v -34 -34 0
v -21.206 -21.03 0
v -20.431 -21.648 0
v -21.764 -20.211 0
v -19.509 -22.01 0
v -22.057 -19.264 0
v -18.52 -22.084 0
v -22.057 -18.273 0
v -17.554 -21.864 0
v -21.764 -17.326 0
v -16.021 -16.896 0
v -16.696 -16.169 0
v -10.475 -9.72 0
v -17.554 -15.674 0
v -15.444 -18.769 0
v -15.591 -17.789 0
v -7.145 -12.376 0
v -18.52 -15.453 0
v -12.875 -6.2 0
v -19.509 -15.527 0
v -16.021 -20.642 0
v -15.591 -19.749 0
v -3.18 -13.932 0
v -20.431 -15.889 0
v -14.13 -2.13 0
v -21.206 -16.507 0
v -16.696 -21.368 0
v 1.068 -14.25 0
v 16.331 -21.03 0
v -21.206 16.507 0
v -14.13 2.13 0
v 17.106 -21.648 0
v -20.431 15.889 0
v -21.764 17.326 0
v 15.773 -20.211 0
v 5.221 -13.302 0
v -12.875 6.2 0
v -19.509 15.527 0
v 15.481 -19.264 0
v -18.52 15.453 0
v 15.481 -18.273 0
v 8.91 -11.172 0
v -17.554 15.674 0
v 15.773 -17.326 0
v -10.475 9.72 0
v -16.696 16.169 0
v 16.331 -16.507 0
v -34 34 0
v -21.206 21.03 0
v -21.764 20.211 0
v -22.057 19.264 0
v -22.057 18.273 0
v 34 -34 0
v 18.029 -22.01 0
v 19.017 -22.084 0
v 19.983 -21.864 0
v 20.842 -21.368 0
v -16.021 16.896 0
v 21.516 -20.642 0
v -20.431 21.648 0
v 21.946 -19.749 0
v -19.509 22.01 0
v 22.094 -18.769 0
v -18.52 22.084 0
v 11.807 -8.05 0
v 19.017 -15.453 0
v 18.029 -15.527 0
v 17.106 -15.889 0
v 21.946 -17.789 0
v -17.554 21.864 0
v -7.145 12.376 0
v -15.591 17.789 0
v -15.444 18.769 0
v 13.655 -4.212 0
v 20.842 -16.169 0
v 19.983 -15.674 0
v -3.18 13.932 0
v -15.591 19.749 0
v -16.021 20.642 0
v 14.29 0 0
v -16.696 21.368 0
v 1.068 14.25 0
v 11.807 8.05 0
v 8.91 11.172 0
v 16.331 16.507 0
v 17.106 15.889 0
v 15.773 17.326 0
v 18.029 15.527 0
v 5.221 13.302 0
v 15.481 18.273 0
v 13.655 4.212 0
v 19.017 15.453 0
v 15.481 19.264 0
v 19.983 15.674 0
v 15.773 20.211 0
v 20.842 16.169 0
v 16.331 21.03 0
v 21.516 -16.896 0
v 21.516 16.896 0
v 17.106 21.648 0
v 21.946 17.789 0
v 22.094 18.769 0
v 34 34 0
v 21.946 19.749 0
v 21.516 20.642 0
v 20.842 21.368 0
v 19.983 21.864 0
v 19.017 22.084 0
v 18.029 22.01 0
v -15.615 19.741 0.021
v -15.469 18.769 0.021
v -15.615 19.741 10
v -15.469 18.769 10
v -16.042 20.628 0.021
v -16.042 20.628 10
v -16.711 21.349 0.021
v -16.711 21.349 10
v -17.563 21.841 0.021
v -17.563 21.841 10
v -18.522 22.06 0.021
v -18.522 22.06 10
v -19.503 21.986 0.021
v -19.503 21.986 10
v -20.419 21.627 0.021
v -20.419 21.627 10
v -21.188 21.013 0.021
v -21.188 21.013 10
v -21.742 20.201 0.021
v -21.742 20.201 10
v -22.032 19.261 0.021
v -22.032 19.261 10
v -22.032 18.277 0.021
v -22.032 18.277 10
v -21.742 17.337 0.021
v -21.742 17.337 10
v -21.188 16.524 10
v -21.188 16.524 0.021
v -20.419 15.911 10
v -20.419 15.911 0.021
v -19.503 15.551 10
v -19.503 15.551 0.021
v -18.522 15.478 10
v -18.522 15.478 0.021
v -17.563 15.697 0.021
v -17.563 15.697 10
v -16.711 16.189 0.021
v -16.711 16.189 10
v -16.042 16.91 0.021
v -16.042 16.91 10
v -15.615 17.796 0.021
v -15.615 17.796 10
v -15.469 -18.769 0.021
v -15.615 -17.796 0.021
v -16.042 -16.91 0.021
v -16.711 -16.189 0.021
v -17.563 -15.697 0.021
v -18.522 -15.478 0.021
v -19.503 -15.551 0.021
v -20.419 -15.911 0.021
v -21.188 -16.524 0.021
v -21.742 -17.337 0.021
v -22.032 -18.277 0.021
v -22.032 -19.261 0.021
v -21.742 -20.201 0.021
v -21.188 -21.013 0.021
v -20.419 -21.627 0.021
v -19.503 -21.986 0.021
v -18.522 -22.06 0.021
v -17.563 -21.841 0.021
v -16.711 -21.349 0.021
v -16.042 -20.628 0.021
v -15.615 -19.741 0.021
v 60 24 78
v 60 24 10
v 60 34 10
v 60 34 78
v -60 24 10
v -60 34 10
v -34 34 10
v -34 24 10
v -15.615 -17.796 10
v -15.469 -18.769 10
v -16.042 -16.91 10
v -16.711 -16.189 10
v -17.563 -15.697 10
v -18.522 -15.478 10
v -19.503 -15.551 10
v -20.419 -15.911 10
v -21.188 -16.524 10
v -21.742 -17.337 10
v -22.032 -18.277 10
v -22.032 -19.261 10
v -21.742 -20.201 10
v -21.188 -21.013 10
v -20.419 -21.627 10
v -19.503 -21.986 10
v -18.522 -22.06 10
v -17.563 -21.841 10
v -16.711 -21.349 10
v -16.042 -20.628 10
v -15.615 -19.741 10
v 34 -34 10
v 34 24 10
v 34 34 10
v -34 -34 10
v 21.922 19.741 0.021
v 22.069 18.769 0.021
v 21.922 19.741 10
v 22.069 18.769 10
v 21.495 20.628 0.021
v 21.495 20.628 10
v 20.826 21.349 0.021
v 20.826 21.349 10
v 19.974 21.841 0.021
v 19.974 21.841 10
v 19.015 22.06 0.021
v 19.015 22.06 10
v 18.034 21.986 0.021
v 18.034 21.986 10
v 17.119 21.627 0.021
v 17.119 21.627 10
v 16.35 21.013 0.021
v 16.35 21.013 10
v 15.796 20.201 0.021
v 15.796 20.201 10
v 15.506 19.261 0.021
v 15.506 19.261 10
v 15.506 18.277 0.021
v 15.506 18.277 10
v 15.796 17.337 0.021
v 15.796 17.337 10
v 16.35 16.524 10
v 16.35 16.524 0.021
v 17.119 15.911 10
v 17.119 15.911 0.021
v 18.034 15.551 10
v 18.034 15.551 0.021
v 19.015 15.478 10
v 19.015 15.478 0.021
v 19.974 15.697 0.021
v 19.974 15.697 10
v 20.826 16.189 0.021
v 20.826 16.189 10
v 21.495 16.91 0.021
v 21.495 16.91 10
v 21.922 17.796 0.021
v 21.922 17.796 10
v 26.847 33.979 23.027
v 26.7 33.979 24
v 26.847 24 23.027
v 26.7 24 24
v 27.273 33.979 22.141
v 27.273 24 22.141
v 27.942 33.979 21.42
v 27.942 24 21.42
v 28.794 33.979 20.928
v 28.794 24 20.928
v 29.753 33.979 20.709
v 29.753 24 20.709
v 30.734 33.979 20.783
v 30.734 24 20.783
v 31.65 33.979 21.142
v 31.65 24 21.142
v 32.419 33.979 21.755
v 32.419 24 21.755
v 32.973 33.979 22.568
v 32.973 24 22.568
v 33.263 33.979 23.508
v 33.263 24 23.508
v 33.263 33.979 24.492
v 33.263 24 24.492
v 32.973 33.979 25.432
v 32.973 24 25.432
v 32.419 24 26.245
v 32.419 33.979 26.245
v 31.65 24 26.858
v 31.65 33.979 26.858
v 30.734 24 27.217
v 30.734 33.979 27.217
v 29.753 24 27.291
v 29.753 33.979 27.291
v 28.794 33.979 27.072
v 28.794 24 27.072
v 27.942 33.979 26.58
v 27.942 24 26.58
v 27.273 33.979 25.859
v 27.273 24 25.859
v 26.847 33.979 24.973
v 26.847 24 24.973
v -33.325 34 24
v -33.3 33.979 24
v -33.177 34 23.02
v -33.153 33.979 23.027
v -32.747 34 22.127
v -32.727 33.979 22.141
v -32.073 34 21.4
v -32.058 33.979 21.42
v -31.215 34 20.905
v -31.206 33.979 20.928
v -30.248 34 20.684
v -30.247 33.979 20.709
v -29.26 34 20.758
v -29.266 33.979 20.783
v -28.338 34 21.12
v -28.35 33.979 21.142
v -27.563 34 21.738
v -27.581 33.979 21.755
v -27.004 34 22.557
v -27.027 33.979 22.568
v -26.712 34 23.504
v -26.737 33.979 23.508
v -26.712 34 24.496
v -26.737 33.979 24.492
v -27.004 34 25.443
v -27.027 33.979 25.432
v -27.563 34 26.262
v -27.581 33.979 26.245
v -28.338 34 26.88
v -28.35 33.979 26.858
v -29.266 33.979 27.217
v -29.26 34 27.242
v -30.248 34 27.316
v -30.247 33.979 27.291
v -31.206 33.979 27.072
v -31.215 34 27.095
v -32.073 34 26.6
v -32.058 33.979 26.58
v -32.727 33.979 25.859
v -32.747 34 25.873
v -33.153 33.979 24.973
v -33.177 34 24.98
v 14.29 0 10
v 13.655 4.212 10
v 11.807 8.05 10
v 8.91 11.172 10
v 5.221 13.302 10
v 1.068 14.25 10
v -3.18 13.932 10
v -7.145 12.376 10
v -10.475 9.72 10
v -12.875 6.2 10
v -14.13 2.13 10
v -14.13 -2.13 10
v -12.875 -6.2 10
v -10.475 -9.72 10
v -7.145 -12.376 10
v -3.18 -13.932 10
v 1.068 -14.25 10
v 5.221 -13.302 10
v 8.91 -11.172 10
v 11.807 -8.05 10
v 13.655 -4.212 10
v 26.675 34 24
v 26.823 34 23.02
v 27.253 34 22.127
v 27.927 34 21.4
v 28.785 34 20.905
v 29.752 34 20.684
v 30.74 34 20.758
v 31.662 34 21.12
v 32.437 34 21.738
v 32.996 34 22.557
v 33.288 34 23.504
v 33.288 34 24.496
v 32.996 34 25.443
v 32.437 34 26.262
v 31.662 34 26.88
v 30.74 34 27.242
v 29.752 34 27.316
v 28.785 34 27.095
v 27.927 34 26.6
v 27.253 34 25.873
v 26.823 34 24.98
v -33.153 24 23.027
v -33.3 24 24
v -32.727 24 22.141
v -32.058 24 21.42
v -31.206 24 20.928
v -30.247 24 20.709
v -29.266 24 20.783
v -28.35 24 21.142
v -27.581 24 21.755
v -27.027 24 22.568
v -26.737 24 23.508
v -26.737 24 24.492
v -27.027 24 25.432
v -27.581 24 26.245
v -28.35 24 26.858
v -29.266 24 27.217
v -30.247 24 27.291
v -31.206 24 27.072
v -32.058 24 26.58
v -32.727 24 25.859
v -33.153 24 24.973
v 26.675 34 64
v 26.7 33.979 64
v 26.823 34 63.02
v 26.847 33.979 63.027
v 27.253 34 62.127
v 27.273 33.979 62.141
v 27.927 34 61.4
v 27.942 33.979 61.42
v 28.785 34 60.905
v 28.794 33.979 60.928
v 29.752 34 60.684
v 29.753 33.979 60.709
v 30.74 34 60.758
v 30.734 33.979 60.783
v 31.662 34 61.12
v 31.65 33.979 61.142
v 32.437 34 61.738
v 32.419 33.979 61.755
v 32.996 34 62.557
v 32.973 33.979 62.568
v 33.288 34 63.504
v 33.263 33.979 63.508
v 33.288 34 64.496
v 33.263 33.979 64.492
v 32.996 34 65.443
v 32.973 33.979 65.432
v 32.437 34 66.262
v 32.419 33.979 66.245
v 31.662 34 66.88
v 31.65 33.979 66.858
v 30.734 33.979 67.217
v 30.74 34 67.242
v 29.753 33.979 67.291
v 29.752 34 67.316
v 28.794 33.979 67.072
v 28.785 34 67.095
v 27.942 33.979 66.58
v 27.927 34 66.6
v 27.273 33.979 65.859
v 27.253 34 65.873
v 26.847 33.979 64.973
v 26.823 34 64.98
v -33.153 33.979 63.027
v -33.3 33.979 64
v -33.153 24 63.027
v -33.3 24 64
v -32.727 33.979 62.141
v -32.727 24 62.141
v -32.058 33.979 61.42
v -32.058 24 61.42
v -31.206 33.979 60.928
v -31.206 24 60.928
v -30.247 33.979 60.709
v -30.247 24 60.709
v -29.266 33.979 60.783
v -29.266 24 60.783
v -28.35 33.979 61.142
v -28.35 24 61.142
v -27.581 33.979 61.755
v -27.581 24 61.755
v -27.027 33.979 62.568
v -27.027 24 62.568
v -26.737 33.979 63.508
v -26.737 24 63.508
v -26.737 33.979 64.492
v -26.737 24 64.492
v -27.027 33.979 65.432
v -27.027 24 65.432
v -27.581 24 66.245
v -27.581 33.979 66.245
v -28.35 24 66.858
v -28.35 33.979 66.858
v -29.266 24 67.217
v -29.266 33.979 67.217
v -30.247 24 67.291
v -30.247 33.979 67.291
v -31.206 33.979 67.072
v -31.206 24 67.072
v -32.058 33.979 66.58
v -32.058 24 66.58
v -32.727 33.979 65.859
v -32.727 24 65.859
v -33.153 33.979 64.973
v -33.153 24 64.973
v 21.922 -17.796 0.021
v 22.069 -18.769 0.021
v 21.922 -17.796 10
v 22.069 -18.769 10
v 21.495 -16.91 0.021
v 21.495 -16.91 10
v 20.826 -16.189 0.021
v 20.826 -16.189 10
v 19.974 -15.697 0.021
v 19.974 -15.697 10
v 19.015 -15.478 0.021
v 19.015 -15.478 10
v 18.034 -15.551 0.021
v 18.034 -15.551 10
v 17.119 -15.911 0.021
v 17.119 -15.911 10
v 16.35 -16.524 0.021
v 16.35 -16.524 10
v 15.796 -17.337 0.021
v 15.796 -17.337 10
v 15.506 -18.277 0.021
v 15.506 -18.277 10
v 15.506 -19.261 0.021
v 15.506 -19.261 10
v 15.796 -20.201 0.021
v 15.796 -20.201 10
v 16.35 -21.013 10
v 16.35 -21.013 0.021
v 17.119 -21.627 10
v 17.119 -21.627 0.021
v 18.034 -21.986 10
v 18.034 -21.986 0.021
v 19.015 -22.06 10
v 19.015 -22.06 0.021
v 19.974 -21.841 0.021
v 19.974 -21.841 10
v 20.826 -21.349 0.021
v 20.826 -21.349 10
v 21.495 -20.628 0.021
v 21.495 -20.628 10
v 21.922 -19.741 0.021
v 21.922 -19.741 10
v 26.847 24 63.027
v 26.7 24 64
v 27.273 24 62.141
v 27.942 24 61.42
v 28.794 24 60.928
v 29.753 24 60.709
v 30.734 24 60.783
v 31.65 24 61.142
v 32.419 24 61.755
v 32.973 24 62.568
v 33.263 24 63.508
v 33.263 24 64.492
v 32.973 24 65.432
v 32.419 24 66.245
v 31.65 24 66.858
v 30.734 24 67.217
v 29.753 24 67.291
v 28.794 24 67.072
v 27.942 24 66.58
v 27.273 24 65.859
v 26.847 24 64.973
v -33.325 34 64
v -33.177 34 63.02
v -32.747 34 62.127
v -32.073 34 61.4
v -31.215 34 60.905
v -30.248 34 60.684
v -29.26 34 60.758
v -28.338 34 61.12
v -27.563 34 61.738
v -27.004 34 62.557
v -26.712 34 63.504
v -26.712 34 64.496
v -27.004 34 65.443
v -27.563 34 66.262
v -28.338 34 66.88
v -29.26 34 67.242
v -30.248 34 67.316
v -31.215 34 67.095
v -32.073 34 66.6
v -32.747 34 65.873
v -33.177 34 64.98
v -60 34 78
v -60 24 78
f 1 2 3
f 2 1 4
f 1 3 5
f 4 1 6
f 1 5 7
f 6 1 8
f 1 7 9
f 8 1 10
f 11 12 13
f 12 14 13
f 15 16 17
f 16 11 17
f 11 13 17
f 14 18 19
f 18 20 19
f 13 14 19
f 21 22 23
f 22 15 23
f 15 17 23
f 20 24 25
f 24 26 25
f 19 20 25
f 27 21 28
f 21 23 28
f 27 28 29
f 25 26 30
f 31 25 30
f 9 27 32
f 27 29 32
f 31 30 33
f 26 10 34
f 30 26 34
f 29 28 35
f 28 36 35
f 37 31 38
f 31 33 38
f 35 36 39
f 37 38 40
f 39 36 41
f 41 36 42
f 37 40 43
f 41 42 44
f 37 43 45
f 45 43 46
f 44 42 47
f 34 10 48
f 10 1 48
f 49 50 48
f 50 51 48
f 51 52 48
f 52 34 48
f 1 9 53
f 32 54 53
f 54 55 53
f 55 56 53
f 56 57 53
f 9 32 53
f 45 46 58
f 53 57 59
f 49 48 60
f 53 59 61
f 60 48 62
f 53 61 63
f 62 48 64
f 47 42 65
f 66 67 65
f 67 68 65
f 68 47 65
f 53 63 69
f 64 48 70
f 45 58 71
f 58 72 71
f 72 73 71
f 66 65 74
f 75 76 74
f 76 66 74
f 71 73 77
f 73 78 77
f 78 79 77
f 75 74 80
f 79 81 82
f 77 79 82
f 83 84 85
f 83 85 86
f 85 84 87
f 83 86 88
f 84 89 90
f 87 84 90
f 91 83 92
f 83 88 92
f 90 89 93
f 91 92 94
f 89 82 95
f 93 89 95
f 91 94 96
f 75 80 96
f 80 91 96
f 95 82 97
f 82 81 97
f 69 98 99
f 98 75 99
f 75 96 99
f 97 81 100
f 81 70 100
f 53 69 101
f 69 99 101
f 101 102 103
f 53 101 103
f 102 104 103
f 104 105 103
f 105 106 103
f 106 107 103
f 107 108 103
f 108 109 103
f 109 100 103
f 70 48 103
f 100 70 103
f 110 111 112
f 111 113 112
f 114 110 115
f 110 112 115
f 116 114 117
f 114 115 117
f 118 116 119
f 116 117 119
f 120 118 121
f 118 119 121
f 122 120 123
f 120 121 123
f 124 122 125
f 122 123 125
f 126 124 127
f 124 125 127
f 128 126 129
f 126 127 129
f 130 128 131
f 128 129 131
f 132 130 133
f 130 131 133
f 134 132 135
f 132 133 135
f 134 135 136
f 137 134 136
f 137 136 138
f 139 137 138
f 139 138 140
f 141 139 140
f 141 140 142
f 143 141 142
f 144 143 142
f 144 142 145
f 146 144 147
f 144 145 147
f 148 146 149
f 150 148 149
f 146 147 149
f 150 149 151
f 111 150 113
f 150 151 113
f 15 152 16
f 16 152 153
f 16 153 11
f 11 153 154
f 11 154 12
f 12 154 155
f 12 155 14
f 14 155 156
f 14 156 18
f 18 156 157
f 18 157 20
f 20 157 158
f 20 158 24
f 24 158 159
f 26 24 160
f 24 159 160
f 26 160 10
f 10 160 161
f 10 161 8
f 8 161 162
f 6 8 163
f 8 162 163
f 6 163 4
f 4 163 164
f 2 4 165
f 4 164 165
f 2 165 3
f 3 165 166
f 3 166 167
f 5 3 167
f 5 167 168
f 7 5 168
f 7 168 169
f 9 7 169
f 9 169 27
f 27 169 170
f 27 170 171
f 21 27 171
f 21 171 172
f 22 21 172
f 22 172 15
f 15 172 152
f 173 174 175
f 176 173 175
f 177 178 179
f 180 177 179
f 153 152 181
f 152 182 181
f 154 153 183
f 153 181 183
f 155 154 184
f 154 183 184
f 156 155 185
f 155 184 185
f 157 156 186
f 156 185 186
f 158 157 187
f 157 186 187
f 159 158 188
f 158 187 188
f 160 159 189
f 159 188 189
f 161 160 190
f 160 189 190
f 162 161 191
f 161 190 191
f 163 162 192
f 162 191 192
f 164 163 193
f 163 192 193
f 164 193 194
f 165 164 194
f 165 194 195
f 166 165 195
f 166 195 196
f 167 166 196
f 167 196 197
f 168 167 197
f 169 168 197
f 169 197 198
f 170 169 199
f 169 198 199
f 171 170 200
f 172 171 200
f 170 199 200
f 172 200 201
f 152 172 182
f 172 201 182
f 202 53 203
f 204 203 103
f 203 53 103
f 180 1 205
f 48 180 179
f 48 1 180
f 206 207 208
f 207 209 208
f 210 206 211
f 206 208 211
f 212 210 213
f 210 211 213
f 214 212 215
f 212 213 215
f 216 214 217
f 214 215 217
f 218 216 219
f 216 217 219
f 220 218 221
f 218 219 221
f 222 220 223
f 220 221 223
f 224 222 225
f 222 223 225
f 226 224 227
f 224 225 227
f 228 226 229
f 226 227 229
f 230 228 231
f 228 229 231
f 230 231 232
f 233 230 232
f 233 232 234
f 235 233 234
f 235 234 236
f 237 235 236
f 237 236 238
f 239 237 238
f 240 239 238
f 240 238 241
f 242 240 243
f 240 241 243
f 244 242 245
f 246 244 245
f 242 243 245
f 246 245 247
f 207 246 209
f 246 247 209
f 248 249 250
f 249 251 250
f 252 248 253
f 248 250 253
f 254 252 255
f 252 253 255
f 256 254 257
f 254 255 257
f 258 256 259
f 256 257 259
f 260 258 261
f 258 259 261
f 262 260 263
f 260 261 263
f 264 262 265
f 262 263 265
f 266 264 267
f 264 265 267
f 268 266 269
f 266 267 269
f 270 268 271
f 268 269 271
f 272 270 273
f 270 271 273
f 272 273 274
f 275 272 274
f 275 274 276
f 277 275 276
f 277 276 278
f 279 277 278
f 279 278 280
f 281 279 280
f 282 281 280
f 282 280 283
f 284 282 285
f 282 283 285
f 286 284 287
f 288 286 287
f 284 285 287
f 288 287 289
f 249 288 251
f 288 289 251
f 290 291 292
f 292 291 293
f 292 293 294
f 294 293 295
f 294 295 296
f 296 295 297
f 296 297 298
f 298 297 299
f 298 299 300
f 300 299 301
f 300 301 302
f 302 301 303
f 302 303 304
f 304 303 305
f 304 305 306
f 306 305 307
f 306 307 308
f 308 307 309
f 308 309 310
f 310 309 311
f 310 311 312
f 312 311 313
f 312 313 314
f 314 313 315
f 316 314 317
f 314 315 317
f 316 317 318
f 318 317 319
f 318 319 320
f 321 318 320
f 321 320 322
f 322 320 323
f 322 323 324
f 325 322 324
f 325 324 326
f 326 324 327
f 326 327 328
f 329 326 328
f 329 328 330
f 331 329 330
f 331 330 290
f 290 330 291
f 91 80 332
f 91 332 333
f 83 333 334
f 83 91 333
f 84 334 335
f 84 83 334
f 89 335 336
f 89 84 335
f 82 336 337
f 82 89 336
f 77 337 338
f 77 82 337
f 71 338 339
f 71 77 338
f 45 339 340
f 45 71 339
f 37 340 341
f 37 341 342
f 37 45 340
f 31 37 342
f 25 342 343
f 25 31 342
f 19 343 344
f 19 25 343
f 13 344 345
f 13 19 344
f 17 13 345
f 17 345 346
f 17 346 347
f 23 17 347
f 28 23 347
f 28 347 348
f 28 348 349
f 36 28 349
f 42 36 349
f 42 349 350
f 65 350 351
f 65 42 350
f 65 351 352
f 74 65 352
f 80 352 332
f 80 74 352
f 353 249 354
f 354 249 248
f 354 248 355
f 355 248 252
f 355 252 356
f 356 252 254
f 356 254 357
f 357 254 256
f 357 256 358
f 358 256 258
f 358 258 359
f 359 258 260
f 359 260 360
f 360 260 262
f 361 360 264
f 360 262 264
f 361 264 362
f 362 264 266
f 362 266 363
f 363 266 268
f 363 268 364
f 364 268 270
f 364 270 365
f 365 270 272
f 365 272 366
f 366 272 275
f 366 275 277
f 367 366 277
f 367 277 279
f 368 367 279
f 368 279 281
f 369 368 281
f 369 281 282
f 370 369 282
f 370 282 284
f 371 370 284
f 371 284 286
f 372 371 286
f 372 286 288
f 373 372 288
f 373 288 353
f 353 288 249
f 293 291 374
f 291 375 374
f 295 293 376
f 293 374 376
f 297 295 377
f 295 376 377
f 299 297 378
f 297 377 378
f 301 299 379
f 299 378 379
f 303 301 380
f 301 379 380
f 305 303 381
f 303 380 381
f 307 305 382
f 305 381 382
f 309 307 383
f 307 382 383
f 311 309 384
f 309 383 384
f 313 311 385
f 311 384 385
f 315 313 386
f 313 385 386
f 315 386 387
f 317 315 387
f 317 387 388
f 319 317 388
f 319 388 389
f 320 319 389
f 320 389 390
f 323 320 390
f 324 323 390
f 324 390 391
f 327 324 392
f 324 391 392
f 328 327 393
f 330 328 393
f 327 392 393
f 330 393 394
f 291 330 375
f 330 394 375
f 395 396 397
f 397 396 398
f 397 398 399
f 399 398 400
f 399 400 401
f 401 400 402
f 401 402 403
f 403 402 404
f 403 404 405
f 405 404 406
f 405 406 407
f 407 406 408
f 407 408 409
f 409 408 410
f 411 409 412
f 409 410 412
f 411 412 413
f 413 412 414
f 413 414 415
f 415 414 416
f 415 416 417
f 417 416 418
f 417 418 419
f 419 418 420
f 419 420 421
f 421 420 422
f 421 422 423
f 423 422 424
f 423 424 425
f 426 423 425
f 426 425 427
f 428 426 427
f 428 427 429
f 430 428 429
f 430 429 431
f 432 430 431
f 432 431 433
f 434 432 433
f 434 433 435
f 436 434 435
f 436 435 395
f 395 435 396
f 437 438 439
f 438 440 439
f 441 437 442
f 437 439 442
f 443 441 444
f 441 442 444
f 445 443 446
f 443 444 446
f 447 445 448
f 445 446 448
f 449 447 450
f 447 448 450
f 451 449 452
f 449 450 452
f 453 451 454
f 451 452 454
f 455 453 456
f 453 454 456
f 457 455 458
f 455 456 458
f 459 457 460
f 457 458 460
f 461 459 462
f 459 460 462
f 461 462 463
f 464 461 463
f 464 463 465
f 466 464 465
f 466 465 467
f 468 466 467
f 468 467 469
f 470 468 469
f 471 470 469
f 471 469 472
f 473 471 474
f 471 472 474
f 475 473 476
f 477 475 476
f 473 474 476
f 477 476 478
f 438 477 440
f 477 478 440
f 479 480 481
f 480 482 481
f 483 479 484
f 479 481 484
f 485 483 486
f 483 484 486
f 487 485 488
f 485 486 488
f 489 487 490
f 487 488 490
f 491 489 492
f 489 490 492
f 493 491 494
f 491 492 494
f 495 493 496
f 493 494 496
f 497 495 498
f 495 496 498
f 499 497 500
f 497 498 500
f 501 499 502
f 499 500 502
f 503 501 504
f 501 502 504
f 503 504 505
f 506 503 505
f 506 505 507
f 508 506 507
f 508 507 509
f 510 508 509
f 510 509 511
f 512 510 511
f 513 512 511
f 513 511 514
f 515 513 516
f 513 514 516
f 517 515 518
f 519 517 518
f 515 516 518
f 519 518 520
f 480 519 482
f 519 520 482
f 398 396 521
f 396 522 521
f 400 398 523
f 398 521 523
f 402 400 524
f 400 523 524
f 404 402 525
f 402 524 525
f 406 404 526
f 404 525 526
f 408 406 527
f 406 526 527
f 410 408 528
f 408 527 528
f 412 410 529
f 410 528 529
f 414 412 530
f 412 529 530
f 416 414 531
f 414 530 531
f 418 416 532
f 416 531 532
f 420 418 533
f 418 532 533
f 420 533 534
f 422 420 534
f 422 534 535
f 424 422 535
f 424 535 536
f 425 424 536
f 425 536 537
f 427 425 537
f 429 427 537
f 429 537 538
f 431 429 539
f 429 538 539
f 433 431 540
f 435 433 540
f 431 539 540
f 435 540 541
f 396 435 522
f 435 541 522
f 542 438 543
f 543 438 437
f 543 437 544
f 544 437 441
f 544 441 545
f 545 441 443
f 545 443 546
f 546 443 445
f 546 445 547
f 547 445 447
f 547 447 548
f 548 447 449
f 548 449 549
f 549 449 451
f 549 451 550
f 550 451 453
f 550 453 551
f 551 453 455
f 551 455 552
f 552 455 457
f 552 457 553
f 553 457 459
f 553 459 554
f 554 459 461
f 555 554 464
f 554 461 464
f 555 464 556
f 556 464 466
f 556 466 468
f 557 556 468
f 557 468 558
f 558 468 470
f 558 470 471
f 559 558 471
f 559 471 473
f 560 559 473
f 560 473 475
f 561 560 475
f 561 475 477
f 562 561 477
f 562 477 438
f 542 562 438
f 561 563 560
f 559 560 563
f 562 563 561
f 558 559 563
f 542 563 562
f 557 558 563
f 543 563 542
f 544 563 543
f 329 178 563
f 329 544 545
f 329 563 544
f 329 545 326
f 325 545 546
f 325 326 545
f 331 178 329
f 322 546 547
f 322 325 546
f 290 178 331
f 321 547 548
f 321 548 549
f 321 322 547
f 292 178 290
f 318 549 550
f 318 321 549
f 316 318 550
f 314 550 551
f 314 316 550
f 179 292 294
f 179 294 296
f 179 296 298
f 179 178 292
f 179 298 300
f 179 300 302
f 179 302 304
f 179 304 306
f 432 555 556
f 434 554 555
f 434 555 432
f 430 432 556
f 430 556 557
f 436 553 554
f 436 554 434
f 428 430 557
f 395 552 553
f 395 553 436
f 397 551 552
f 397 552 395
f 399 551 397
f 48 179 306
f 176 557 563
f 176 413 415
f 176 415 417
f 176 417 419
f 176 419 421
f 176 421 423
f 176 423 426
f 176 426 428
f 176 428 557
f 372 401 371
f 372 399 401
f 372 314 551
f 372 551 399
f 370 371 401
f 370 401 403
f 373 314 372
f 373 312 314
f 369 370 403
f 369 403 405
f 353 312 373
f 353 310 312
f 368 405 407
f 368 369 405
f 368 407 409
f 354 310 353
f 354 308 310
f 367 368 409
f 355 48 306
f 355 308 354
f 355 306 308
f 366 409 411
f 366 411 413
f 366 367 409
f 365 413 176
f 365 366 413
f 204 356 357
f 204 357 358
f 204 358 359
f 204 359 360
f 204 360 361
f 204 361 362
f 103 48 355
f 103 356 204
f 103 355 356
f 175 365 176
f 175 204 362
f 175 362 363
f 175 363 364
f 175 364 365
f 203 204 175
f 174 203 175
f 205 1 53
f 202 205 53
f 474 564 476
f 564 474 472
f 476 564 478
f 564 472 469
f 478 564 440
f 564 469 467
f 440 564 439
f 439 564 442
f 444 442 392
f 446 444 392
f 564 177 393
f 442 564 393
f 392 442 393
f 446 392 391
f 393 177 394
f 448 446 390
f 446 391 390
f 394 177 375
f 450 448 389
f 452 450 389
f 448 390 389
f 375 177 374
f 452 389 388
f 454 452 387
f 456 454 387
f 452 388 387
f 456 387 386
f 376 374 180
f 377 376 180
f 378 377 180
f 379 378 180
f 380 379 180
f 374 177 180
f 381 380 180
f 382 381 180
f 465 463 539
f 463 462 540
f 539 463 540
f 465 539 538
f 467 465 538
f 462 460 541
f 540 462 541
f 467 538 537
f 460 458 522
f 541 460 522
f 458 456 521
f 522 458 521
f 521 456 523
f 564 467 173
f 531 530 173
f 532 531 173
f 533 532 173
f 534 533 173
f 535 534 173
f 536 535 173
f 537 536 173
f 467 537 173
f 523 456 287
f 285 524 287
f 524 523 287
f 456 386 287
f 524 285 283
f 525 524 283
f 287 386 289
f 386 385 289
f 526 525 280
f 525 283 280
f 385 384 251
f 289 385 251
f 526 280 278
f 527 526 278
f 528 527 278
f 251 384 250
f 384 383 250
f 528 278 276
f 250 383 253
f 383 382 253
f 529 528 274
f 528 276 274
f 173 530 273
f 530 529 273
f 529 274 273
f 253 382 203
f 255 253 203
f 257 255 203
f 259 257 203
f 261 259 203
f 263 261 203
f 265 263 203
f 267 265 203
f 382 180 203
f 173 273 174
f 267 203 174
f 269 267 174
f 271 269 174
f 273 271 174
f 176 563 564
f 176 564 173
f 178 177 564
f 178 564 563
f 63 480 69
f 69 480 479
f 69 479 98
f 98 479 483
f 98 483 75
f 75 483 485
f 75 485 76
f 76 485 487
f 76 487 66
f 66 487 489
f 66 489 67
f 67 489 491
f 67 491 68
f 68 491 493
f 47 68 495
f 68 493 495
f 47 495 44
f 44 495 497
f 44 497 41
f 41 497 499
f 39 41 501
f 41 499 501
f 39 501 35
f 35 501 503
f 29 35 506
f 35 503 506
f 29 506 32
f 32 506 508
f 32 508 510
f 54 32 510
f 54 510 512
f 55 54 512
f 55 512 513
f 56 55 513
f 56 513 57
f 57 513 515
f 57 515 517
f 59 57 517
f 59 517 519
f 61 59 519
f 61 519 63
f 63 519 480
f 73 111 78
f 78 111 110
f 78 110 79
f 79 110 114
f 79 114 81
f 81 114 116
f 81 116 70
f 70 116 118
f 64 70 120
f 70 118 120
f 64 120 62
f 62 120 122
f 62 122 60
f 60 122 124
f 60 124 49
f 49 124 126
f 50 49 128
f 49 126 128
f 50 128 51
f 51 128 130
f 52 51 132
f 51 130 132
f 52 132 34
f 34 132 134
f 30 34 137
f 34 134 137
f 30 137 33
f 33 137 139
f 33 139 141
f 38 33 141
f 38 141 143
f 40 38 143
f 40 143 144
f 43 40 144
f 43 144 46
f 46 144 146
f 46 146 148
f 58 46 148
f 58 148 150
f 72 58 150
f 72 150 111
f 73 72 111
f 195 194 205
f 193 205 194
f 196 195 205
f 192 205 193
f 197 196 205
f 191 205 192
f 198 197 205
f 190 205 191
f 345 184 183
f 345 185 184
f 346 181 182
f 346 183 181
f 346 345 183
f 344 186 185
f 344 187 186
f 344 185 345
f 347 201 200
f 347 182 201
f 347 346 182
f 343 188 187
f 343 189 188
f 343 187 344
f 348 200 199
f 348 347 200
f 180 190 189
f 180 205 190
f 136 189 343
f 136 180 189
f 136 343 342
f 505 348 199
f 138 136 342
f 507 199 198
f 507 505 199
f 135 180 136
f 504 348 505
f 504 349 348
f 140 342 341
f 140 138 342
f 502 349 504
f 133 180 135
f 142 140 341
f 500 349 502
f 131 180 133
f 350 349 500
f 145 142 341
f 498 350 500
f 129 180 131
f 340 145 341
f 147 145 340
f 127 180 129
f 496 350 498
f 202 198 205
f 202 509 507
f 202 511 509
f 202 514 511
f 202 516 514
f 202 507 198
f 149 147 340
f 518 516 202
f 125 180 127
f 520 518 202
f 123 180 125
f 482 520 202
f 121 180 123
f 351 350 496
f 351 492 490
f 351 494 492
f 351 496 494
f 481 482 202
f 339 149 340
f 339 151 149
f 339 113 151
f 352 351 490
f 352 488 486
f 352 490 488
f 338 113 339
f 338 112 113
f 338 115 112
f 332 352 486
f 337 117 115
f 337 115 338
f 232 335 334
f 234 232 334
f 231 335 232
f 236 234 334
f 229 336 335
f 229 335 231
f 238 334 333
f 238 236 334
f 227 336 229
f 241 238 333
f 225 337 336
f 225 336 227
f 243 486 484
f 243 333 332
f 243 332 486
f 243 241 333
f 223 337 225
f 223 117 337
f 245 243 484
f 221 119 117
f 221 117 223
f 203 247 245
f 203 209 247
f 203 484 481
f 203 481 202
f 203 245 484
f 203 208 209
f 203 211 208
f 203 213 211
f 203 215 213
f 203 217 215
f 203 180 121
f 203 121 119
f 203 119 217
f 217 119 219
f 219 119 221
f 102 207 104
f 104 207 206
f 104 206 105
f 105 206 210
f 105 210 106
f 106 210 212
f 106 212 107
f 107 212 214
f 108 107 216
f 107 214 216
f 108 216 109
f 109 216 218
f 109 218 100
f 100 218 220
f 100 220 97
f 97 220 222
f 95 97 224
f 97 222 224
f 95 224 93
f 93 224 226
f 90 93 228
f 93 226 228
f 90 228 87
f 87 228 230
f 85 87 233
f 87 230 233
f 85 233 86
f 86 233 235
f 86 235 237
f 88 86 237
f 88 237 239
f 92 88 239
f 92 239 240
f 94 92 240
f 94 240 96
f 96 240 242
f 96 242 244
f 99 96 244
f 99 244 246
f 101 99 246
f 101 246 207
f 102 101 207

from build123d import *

# Parameters (mm, degrees)
SKETCH1_W                      = 68
SKETCH1_H                      = 68
SKETCH1_R                      = 14.29
BOSS_EXTRUDE1_DEPTH            = 10
M6_CLEARANCE_HOLE1_D           = 6.6
M6_CLEARANCE_HOLE1_CSINK_D     = 6.65
M6_CLEARANCE_HOLE1_CSINK_ANGLE = 100
SKETCH5_W                      = 120
SKETCH5_H                      = 10
BOSS_EXTRUDE3_DEPTH            = 68
M6_CLEARANCE_HOLE2_D           = 6.6
M6_CLEARANCE_HOLE2_CSINK_D     = 6.65
M6_CLEARANCE_HOLE2_CSINK_ANGLE = 100


with BuildPart() as part:
    # Sketch1 → Boss-Extrude1 (new body)
    with BuildSketch(Plane.XY):
        Rectangle(SKETCH1_W, SKETCH1_H)
        Circle(SKETCH1_R, mode=Mode.SUBTRACT)
    extrude(amount=BOSS_EXTRUDE1_DEPTH)

    # M6 Clearance Hole1 (through all)
    with Locations(Plane(origin=(0, 0, 0), x_dir=(-1, 0, 0), z_dir=(0, 0, -1))):
        with Locations((-18.768735293, 18.768735293), (18.768735293, 18.768735293), (-18.768735293, -18.768735293), (18.768735293, -18.768735293)):
            CounterSinkHole(M6_CLEARANCE_HOLE1_D / 2, M6_CLEARANCE_HOLE1_CSINK_D / 2, counter_sink_angle=M6_CLEARANCE_HOLE1_CSINK_ANGLE)

    # Sketch5 → Boss-Extrude3 (add)
    with BuildSketch(Plane.XY.offset(10)):
        with Locations((0, 29)):
            Rectangle(SKETCH5_W, SKETCH5_H)
    extrude(amount=BOSS_EXTRUDE3_DEPTH)

    # M6 Clearance Hole2 (through all)
    with Locations(Plane(origin=(0, 34, 0), x_dir=(1, 0, 0), z_dir=(0, 1, 0))):
        with Locations((-30, -24), (30, -24), (-30, -64), (30, -64)):
            CounterSinkHole(M6_CLEARANCE_HOLE2_D / 2, M6_CLEARANCE_HOLE2_CSINK_D / 2, counter_sink_angle=M6_CLEARANCE_HOLE2_CSINK_ANGLE)


solid = part.part
